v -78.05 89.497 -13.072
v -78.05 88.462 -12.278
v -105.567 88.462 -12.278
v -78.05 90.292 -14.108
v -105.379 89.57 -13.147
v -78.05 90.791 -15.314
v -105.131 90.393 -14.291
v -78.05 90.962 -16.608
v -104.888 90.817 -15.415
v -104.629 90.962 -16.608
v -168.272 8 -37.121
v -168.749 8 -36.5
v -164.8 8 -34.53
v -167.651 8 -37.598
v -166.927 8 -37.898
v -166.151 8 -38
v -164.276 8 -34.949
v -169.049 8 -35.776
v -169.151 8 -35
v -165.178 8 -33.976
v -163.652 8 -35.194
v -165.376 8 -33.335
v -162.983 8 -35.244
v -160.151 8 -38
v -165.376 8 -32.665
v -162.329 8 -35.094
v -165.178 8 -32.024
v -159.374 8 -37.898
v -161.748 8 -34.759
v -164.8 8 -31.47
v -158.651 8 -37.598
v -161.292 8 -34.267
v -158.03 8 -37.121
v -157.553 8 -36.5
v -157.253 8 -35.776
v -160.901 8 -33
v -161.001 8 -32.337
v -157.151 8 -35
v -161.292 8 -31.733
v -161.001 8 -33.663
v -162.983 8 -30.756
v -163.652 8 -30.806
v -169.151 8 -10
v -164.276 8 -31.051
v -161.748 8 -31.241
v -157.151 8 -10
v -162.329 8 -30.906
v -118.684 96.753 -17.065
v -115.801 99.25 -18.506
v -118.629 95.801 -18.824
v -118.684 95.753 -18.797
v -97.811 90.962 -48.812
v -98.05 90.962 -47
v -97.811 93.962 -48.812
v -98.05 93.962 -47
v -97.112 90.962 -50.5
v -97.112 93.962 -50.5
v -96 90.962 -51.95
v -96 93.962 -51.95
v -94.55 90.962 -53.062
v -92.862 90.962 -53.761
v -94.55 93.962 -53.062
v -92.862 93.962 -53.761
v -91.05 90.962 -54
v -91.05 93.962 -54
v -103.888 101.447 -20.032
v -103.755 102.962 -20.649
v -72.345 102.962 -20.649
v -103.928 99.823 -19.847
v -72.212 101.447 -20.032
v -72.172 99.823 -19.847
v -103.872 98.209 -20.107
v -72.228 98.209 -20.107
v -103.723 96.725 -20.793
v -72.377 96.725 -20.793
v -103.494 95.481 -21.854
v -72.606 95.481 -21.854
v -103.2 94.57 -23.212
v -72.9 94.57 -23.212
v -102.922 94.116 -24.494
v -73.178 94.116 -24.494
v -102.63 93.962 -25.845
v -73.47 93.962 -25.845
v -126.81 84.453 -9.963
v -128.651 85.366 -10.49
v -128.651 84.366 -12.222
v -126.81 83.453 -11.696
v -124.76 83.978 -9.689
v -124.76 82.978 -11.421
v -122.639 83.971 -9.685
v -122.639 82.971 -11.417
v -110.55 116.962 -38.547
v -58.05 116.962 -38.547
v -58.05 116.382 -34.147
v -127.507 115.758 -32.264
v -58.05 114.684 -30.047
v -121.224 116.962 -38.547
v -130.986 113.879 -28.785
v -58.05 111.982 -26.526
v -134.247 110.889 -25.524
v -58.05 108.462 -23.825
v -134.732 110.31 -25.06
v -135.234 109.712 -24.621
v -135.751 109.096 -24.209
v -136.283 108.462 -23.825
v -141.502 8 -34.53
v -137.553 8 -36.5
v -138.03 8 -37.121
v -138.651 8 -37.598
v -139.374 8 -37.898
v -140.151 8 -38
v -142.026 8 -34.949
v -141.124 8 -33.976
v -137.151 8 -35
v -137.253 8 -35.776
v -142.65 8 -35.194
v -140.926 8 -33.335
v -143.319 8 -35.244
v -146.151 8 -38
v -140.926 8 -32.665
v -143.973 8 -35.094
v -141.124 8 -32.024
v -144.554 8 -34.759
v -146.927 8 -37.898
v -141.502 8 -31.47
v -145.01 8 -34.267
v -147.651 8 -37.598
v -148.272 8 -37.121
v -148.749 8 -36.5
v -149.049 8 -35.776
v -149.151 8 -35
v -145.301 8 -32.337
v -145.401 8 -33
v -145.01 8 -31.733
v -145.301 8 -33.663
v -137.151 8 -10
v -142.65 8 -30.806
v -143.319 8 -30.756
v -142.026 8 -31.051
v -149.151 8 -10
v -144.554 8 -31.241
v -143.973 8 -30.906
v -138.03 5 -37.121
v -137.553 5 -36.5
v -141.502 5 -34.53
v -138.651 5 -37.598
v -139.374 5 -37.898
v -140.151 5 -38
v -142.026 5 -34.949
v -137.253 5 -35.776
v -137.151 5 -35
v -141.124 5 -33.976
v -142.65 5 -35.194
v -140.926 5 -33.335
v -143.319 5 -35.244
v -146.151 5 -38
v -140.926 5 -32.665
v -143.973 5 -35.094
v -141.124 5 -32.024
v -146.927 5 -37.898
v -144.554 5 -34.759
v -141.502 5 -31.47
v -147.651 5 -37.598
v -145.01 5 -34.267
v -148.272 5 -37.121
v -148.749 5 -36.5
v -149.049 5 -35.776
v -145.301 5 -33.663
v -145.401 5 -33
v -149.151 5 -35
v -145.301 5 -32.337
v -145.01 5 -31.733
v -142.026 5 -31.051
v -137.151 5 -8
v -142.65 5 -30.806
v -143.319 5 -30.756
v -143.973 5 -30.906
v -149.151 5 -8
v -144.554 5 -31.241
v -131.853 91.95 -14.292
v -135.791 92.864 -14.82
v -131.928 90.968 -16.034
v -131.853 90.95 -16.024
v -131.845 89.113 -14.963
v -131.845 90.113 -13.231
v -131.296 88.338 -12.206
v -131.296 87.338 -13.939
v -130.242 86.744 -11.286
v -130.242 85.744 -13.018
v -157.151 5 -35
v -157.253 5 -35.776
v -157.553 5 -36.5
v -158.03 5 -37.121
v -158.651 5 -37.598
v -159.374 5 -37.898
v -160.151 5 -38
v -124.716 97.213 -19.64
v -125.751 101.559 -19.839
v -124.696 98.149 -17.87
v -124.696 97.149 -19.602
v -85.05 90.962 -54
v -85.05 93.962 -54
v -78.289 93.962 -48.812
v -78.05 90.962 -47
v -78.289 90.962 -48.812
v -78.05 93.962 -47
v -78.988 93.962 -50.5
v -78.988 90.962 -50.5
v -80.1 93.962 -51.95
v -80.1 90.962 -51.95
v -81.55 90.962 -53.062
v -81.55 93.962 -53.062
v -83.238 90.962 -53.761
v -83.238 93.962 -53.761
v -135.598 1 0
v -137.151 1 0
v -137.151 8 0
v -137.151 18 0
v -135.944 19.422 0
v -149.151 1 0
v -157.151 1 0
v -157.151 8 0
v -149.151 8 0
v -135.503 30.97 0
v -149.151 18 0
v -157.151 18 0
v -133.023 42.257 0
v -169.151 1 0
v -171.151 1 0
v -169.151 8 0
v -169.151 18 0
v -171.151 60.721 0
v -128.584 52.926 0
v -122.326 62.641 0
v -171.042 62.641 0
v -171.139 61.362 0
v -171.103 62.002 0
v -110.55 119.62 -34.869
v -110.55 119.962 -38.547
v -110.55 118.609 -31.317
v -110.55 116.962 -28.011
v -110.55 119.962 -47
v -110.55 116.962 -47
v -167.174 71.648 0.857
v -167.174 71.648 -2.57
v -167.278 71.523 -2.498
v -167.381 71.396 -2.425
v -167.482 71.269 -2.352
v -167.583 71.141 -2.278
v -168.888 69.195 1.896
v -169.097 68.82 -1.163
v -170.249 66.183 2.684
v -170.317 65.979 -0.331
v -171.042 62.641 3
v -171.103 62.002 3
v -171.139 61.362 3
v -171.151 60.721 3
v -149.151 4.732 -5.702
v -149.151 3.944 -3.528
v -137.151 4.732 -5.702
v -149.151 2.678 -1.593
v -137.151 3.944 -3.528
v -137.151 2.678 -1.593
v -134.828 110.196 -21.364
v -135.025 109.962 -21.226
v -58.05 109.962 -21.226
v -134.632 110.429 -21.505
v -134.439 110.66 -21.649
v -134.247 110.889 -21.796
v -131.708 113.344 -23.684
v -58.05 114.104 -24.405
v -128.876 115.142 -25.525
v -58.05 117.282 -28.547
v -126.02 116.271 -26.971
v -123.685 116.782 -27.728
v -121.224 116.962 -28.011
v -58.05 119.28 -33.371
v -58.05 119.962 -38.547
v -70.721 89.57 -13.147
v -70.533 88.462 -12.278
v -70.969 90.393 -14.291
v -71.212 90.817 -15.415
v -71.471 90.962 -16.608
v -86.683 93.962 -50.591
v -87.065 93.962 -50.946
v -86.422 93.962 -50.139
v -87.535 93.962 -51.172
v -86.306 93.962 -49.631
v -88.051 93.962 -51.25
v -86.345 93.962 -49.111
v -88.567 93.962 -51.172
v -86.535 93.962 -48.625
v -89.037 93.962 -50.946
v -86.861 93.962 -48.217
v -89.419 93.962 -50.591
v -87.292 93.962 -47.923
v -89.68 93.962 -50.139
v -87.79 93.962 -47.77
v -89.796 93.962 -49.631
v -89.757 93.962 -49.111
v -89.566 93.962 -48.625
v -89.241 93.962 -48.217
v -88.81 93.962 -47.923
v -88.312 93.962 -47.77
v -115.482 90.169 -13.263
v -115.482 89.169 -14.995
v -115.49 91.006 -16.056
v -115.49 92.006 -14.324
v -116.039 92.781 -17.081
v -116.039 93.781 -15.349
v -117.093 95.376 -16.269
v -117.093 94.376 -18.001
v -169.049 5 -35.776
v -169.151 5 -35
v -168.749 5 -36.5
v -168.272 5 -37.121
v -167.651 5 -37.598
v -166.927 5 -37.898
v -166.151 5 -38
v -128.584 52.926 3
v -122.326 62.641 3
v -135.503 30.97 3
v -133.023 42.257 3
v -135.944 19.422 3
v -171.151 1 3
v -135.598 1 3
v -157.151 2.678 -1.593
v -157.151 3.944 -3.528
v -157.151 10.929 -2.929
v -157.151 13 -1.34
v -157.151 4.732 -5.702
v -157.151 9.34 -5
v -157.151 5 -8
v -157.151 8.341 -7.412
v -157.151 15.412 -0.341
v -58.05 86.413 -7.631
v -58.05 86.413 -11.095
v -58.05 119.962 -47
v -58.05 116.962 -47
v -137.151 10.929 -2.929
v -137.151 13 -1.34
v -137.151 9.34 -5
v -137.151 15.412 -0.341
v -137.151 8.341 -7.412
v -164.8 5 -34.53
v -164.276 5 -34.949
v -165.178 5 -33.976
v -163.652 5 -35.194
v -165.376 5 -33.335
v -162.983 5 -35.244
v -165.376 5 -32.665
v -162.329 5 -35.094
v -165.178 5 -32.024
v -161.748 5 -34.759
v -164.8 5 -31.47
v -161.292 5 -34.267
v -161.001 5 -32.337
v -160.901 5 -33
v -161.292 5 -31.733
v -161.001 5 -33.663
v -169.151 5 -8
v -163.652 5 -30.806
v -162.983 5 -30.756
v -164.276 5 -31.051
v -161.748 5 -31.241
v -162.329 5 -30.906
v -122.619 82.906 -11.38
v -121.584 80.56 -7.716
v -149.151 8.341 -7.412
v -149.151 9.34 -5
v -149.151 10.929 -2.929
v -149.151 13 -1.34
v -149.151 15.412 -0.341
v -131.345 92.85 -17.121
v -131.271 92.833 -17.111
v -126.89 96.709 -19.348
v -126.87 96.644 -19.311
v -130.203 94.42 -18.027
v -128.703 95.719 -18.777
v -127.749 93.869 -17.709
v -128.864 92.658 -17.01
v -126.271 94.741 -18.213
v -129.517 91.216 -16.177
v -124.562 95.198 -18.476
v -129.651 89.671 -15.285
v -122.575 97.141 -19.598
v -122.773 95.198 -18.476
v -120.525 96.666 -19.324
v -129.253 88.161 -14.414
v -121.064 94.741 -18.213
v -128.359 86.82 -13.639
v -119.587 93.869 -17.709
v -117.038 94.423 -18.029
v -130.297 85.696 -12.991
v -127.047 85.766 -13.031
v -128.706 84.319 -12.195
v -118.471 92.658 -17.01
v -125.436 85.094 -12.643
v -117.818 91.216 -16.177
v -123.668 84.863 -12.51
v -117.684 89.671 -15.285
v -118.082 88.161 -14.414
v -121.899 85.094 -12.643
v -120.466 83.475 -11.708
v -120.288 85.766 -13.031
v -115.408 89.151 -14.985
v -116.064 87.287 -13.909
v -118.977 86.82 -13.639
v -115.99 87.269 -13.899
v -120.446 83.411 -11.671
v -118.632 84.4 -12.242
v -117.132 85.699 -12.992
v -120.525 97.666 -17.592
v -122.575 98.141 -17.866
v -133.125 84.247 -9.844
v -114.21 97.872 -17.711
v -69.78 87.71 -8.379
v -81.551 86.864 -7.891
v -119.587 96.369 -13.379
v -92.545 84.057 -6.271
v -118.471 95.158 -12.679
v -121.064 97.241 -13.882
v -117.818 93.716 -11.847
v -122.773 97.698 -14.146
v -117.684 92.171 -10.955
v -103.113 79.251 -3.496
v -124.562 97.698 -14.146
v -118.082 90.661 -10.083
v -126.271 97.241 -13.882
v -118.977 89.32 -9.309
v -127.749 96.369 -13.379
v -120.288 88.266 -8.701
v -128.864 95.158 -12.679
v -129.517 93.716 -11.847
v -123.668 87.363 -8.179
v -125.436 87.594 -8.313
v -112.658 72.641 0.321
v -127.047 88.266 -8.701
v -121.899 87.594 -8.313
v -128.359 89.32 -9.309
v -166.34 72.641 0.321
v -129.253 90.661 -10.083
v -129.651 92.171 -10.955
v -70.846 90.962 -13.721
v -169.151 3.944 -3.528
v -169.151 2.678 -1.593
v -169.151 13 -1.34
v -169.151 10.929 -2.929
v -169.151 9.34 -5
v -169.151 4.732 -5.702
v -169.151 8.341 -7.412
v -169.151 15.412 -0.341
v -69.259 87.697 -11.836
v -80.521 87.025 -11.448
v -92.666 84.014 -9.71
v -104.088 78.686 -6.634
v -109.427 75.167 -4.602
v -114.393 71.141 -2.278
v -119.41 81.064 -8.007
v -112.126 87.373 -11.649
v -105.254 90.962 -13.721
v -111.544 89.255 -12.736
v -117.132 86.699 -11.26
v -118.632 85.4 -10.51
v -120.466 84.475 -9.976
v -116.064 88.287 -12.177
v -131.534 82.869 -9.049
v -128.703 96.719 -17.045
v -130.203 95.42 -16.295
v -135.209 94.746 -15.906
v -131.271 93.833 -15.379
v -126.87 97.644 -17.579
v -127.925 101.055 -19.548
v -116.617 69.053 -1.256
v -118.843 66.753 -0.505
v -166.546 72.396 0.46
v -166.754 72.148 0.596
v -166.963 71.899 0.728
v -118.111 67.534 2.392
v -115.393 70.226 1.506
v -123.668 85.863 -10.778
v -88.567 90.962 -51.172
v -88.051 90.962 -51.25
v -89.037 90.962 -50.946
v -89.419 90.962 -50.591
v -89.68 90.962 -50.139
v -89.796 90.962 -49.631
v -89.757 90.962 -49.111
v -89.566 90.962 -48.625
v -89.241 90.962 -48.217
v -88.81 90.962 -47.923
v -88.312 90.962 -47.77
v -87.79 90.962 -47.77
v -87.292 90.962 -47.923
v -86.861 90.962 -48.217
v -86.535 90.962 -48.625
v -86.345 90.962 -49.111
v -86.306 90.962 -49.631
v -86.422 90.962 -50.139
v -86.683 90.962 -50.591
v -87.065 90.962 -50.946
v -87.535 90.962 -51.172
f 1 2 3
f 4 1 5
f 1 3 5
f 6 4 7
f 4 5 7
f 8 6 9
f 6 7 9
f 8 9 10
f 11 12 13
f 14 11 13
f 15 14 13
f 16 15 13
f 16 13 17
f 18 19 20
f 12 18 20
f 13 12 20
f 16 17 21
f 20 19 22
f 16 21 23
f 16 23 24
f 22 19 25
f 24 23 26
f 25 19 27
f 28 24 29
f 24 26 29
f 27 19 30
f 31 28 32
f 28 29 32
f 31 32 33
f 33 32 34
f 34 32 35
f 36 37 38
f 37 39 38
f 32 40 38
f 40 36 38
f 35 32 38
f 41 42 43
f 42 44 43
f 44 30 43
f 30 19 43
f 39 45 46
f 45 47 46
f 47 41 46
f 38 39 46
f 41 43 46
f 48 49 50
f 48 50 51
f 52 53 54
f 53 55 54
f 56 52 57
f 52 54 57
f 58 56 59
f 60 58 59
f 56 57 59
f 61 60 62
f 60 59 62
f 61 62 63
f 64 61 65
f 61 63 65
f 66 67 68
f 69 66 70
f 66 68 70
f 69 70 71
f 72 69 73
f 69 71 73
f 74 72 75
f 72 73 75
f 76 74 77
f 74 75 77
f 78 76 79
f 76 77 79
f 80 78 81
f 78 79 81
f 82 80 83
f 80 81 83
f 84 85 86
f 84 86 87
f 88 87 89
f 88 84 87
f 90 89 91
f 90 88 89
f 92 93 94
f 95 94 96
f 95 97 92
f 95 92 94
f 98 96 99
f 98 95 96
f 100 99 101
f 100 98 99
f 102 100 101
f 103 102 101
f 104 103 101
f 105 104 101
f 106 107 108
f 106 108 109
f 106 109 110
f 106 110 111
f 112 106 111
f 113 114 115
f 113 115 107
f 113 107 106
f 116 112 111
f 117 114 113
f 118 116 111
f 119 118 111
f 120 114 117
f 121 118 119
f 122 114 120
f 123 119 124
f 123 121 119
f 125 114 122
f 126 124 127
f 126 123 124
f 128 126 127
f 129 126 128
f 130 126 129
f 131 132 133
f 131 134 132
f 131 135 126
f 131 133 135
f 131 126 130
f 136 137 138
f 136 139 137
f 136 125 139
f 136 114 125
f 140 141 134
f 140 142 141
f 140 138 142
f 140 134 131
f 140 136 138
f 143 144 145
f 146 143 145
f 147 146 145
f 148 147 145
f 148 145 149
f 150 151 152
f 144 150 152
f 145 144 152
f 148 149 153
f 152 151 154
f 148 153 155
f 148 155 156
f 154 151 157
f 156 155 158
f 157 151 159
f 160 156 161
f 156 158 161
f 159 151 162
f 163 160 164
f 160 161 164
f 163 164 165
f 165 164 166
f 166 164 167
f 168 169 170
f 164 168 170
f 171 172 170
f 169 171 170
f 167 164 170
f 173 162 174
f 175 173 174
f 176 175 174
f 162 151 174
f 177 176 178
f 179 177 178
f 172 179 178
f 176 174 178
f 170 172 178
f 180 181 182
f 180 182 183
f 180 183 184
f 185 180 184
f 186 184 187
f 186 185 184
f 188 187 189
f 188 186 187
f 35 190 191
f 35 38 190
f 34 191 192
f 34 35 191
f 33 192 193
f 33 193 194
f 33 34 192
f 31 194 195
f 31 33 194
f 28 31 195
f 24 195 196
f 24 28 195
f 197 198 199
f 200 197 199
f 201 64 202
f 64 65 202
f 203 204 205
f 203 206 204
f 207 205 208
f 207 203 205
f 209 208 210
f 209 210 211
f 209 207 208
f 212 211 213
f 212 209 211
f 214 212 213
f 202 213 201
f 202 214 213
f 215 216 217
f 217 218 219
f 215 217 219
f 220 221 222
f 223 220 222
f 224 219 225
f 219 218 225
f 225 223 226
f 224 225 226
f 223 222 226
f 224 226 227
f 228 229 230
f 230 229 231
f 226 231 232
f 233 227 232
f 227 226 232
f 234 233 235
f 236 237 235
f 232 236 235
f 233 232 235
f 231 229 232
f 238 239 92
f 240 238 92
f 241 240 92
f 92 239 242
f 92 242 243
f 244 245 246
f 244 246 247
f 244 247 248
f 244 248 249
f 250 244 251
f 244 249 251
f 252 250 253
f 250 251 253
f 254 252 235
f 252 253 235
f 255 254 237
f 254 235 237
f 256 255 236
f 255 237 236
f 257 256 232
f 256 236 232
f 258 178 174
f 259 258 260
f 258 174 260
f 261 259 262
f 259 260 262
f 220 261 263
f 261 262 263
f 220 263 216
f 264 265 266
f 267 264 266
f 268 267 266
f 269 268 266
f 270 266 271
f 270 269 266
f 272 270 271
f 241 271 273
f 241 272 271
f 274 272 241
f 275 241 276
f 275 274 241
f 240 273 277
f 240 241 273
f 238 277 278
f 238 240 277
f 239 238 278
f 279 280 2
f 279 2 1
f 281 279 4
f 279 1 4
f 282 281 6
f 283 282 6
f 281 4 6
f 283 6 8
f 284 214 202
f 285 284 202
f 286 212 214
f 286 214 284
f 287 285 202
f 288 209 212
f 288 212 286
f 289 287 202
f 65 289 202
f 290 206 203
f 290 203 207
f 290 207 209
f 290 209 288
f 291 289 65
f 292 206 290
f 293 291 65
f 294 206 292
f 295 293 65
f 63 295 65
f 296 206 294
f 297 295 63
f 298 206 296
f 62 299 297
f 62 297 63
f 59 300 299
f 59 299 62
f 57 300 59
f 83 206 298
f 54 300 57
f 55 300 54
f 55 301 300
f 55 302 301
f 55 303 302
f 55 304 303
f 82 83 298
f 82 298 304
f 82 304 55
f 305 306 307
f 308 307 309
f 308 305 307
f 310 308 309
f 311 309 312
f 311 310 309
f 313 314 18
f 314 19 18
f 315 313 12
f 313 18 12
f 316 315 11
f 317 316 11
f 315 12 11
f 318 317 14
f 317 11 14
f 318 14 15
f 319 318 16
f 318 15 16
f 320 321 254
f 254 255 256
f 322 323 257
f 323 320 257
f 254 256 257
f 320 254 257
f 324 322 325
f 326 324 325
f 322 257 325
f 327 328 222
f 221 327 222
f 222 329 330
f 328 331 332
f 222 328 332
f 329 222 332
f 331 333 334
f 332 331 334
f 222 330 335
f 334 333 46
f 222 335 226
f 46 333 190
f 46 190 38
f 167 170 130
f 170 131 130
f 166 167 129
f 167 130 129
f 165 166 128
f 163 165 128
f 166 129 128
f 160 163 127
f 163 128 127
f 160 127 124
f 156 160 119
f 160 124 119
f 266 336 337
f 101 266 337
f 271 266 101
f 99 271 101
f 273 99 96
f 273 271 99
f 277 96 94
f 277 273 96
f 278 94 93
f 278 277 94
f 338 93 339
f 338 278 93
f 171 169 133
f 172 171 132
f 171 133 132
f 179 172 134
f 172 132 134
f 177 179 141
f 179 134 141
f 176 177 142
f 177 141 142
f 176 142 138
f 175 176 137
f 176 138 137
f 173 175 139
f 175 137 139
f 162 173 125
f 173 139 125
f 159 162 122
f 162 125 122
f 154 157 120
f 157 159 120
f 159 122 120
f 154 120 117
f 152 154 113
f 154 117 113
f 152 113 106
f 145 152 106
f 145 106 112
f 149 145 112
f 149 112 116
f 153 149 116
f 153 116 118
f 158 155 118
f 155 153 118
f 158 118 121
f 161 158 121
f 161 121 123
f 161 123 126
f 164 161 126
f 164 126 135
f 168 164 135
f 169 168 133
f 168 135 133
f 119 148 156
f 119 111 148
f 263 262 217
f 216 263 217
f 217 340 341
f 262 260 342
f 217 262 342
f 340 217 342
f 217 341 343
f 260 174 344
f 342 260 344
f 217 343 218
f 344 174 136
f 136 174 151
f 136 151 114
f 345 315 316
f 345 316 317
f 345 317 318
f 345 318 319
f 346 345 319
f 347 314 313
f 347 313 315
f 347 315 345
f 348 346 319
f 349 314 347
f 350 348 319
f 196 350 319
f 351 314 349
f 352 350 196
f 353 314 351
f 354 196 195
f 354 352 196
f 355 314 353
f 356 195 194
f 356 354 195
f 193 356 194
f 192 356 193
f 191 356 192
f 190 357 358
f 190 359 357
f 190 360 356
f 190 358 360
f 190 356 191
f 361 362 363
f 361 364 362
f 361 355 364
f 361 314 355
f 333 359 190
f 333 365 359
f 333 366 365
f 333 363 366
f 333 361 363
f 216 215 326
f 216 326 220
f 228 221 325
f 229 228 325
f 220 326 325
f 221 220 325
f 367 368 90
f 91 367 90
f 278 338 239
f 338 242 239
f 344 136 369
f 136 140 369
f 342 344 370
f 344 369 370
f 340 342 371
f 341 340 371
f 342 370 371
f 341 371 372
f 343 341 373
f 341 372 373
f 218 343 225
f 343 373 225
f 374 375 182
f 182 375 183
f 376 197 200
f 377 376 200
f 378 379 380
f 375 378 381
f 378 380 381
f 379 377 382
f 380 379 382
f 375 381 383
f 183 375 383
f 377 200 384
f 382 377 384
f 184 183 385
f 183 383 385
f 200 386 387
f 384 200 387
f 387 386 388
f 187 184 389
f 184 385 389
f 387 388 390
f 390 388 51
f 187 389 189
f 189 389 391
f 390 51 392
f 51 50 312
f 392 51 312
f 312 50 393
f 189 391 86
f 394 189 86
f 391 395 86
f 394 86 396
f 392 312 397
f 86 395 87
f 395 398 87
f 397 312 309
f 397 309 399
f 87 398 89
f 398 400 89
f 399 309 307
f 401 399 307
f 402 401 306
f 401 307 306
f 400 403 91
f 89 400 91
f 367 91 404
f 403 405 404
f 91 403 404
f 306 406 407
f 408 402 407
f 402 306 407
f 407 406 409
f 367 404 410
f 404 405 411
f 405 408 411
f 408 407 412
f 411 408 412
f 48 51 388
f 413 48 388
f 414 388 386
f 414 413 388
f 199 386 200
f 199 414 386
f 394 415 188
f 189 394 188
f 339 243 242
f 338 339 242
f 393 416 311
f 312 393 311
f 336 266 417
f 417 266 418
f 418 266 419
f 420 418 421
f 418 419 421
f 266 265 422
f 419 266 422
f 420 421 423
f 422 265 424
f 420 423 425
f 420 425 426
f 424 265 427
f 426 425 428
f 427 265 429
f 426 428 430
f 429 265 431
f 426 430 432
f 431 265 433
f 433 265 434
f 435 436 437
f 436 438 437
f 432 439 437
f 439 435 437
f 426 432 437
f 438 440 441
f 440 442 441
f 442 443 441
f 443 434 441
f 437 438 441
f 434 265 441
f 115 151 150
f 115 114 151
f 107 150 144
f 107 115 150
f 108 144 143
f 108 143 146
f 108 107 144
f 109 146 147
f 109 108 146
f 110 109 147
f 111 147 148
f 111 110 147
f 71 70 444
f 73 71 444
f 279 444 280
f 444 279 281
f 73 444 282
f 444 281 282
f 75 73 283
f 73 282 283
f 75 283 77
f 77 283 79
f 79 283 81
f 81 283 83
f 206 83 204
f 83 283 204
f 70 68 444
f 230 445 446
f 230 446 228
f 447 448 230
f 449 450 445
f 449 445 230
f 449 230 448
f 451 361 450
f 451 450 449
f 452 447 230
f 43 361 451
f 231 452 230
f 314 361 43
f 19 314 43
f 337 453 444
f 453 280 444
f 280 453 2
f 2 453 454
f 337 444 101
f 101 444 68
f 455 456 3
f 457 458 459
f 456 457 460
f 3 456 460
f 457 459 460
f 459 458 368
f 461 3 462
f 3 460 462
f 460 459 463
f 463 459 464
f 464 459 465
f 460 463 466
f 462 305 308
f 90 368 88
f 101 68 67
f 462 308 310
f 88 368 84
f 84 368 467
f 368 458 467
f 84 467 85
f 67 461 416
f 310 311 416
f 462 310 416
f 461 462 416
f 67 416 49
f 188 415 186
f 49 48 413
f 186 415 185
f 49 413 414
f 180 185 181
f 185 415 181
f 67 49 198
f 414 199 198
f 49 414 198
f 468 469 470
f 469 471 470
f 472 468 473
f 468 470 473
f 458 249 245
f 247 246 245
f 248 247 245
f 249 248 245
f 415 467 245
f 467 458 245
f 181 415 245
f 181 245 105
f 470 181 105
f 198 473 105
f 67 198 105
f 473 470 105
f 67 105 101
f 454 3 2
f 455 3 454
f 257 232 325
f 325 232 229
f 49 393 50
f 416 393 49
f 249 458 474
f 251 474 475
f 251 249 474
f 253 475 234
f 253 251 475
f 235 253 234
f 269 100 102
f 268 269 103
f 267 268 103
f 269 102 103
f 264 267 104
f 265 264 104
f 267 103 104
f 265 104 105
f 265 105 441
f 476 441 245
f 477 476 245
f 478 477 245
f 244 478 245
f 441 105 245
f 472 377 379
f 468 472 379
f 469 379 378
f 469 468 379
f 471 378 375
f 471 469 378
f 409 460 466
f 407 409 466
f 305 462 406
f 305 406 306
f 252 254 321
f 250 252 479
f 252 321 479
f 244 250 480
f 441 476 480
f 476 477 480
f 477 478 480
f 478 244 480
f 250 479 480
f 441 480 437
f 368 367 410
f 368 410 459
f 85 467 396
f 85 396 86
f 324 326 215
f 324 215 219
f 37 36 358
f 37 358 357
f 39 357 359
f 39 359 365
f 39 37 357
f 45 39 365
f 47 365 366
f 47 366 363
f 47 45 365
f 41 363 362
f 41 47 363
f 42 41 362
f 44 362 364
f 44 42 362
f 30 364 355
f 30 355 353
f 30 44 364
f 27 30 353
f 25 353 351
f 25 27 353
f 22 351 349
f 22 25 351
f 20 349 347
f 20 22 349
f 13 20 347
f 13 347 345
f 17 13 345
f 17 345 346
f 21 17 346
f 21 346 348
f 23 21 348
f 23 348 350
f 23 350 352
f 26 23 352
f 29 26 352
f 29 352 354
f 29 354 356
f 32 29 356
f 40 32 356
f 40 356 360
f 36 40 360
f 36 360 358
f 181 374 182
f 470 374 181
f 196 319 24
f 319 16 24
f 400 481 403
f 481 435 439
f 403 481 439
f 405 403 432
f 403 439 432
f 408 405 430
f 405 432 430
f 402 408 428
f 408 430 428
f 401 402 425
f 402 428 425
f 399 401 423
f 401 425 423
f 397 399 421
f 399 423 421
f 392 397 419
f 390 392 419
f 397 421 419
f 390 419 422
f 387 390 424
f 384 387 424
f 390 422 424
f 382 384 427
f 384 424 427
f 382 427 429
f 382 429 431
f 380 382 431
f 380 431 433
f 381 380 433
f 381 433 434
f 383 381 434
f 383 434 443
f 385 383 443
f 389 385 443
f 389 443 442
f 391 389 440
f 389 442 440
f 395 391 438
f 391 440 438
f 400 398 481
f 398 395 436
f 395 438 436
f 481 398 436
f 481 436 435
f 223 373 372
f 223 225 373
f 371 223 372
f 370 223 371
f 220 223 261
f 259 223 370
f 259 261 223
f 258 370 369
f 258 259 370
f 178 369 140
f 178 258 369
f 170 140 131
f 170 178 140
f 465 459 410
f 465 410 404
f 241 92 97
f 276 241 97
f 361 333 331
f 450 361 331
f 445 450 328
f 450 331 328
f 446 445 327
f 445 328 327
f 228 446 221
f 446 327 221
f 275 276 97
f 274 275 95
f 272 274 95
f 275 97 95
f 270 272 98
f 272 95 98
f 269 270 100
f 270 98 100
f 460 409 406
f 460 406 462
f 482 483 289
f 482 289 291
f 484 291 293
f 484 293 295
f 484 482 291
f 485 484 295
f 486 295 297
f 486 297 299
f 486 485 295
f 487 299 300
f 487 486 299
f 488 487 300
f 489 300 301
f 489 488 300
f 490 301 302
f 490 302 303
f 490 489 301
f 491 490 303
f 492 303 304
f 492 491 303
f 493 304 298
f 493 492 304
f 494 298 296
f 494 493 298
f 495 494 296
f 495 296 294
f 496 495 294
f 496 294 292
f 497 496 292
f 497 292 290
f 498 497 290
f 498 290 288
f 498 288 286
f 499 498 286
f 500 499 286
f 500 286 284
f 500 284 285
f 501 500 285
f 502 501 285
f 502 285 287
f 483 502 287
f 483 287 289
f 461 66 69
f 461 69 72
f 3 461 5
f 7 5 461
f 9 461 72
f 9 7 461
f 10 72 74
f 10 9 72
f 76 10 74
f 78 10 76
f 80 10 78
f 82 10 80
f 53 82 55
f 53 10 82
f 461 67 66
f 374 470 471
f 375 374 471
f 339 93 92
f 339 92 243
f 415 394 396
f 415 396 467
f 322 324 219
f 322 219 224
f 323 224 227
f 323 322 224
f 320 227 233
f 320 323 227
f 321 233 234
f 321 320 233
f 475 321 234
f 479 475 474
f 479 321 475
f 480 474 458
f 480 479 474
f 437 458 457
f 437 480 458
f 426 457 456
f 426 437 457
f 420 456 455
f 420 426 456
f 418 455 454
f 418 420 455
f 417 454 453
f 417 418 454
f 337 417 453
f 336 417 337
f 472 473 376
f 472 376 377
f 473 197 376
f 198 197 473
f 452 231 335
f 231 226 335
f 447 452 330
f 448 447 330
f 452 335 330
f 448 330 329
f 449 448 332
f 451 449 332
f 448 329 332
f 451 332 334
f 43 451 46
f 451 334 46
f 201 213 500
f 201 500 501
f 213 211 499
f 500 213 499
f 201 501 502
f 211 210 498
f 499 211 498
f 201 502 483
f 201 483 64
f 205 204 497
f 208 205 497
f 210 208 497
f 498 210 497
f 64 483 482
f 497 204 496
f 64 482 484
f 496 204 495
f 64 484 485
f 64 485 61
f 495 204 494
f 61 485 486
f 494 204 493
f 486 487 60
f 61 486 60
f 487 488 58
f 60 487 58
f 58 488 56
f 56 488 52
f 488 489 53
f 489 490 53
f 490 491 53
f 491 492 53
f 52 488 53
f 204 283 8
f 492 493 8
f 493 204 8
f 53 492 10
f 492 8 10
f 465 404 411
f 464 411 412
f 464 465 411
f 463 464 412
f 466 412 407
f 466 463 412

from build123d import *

# Parameters (mm, degrees)
SALIENTE_EXTRUIR1_DEPTH  = 58.05
REDONDEO1_R              = 20
REDONDEO2_R              = 20
REDONDEO3_R              = 17
REDONDEO4_R              = 17
CAVIDAD1_START           = -47
CAVIDAD1_DEPTH           = 51
CROQUIS8_W               = 12
CROQUIS8_H               = 3
SALIENTE_EXTRUIR2_DEPTH  = 38
CROQUIS9_R               = 2.25
CORTAR_EXTRUIR6_DEPTH    = 135.588949923
SALIENTE_EXTRUIR3_REACH  = 146.947
CROQUIS11_W              = 20
CROQUIS11_H              = 3
CROQUIS12_W              = 69.238292886
CROQUIS12_H              = 3
CORTAR_EXTRUIR7_DEPTH    = 1
CROQUIS15_R              = 1.75
CORTAR_EXTRUIR10_DEPTH   = 5
REDONDEO5_R              = 7
REDONDEO6_R              = 3
CROQUIS18_R              = 6
CORTAR_EXTRUIR12_DEPTH   = 146.081609054
CROQUIS19_R              = 8.25
CROQUIS19_R_2            = 6
SALIENTE_EXTRUIR4_DEPTH  = 2
CROQUIS16_R              = 65
CORTAR_EXTRUIR11_DEPTH   = 145.946782753
SALIENTE_EXTRUIR5_DEPTH  = 3
NERVIO8_START            = -1.125
NERVIO8_DEPTH            = 2.25
MATRIZC2_COUNT           = 6
REDONDEO6_OF_SIMETR_A1_R = 3
REDONDEO7_R              = 10
REDONDEO8_R              = 10
REDONDEO9_R              = 6
CORTAR_EXTRUIR14_DEPTH   = 145.946782753
REDONDEO10_R             = 5


with BuildPart() as part:
    # Croquis1 → Saliente-Extruir1 (new, symmetric)
    with BuildSketch(Plane(origin=(0, 0, 0), x_dir=(0, 0, -1), z_dir=(1, 0, 0))):
        Polygon((0, 0), (0, 67.196152423), (28.732050808, 116.961524227), (47, 116.961524227), (47, 119.961524227), (27, 119.961524227), (-3, 68), (-3, 0), align=None)
    extrude(amount=SALIENTE_EXTRUIR1_DEPTH, both=True)

    # Redondeo1
    redondeo1_edges = [part.edges().sort_by_distance(p)[0] for p in [
        (0, 68, 3),
    ]]
    fillet(redondeo1_edges, radius=REDONDEO1_R)

    # Redondeo2
    redondeo2_edges = [part.edges().sort_by_distance(p)[0] for p in [
        (0, 119.961524227, -27),
    ]]
    fillet(redondeo2_edges, radius=REDONDEO2_R)

    # Redondeo3
    redondeo3_edges = [part.edges().sort_by_distance(p)[0] for p in [
        (0, 116.961524227, -28.732050808),
    ]]
    fillet(redondeo3_edges, radius=REDONDEO3_R)

    # Redondeo4
    redondeo4_edges = [part.edges().sort_by_distance(p)[0] for p in [
        (0, 67.196152423, 0),
    ]]
    fillet(redondeo4_edges, radius=REDONDEO4_R)

    # Cavidad1: read off the stored shape, not the designer's step
    # Cavidad1 outline → Cavidad1 (cut)
    with BuildSketch(Plane.XY.offset(CAVIDAD1_START)):
        with BuildLine():
            Line((58.05, 0), (58.05, 119.961524227))
            Line((58.05, 119.961524227), (-5.55, 119.961524227))
            Line((-5.55, 119.961524227), (-5.55, 116.961524227))
            Line((-5.55, 116.961524227), (5.123846837, 116.961524227))
            ThreePointArc((5.123846837, 116.961524227), (12.308357287, 115.368756607), (18.14660237, 110.888913592))
            Line((18.14660237, 110.888913592), (51.073651347, 71.647984679))
            ThreePointArc((51.073651347, 71.647984679), (54.025670368, 66.534937751), (55.050895814, 60.720595315))
            Line((55.050895814, 60.720595315), (55.050895814, 0))
            Line((55.050895814, 0), (58.05, 0))
        make_face()
    extrude(amount=CAVIDAD1_DEPTH, mode=Mode.SUBTRACT)

    # Croquis8 → Saliente-Extruir2 (add)
    with BuildSketch(Plane(origin=(0, 0, 0), x_dir=(-1, 0, 0), z_dir=(0, 0, -1))):
        with Locations((-47.050895814, 6.5)):
            Rectangle(CROQUIS8_W, CROQUIS8_H)
    saliente_extruir2 = extrude(amount=SALIENTE_EXTRUIR2_DEPTH)

    # Croquis9 → Cortar-Extruir6 (cut, through all)
    with BuildSketch(Plane(origin=(0, 8, 0), x_dir=(1, 0, 0), z_dir=(0, 1, 0))):
        with Locations(Location((47.050895814, 33, 0), (0, 0, 180))):
            Circle(CROQUIS9_R)
    cortar_extruir6 = extrude(amount=-CORTAR_EXTRUIR6_DEPTH, mode=Mode.SUBTRACT)

    # Saliente-Extruir3: up to this plane
    saliente_extruir3_end = Plane(origin=(58.05, 67.196152423, 0), z_dir=(0, 0.49999999999999767, 0.86602540378444))
    # Croquis11 → Saliente-Extruir3 (add, up to the surface)
    with BuildSketch(Plane(origin=(0, 0, -54), x_dir=(-1, 0, 0), z_dir=(0, 0, -1)), mode=Mode.PRIVATE) as saliente_extruir3_sk1:
        with Locations((28.05, 92.461524227)):
            Rectangle(CROQUIS11_W, CROQUIS11_H)
    saliente_extruir3_tool1 = split(extrude(saliente_extruir3_sk1.sketch, amount=-SALIENTE_EXTRUIR3_REACH, mode=Mode.PRIVATE), bisect_by=saliente_extruir3_end, keep=Keep.BOTH, mode=Mode.PRIVATE)
    add(saliente_extruir3_tool1.solids().sort_by_distance((-28.05, 92.461524, -54))[0])

    # Croquis12 → Cortar-Extruir7 (cut)
    with BuildSketch(Plane.XZ):
        with Locations((20.431749371, 1.5)):
            Rectangle(CROQUIS12_W, CROQUIS12_H)
    extrude(amount=-CORTAR_EXTRUIR7_DEPTH, mode=Mode.SUBTRACT)

    # Croquis15 → Cortar-Extruir10 (cut)
    with BuildSketch(Plane.XZ.offset(-90.961524227)):
        with Locations(Location((-28.049104186, -49.5, 0), (0, 0, 270))):
            Circle(CROQUIS15_R)
    extrude(amount=-CORTAR_EXTRUIR10_DEPTH, mode=Mode.SUBTRACT)

    # Redondeo5
    redondeo5_edges = [part.edges().sort_by_distance(p)[0] for p in [
        (-18.05, 92.461524227, -54),
        (-38.05, 92.461524227, -54),
    ]]
    fillet(redondeo5_edges, radius=REDONDEO5_R)

    # Redondeo6
    redondeo6_edges = [part.edges().sort_by_distance(p)[0] for p in [
        (53.050895814, 6.5, -38),
        (41.050895814, 6.5, -38),
    ]]
    fillet(redondeo6_edges, radius=REDONDEO6_R)

    # Croquis18 → Cortar-Extruir12 (cut, through all)
    with BuildSketch(Plane(origin=(0, 18.299038106, 31.694863729), x_dir=(1, 0, 0), z_dir=(0, 0.4999999999999976, 0.86602540378444))):
        with Locations(Location((7.567578046, 85.748711306, 0), (0, 0, 270))):
            Circle(CROQUIS18_R)
    extrude(amount=-CORTAR_EXTRUIR12_DEPTH, mode=Mode.SUBTRACT)

    # Croquis19 → Saliente-Extruir4 (add)
    with BuildSketch(Plane(origin=(0, 16.799038106, 29.096787517), x_dir=(-1, 0, 0), z_dir=(0, -0.4999999999999977, -0.8660254037844399))):
        with Locations(Location((-7.567578046, 85.748711306, 0), (0, 0, 270))):
            Circle(CROQUIS19_R)
        with Locations(Location((-7.567578046, 85.748711306, 0), (0, 0, 270))):
            Circle(CROQUIS19_R_2, mode=Mode.SUBTRACT)
    extrude(amount=SALIENTE_EXTRUIR4_DEPTH)

    # Croquis16 → Cortar-Extruir11 (cut, through all)
    with BuildSketch(Plane.XY.offset(3)):
        with Locations((-45.071920691, 22.721524227)):
            Circle(CROQUIS16_R)
    extrude(amount=-CORTAR_EXTRUIR11_DEPTH, mode=Mode.SUBTRACT)

    # Croquis25 → Saliente-Extruir5 (add)
    with BuildSketch(Plane.XZ.offset(-90.961524227)):
        Polygon((-38.05, -13.720943809), (-45.254421175, -13.720943809), (-38.05, -47), align=None)
        Polygon((-10.845578825, -13.720943809), (-18.05, -47), (-18.05, -13.720943809), align=None)
    extrude(amount=-SALIENTE_EXTRUIR5_DEPTH)

    # Nervio8: read off the stored shape, not the designer's step
    # Nervio8 outline → Nervio8 (add)
    with BuildSketch(Plane(origin=(46.658144676, 40.407138583, -23.329072338), x_dir=(-0.7071067811865435, 0.6123724356957997, -0.353553390593273), z_dir=(-0.7071067811865517, -0.612372435695792, 0.35355339059327007)).offset(NERVIO8_START)):
        Polygon((47.10947397, -31.598076211), (47.032409489, -31.598076211), (43.032409489, -33.598076211), (47.10947397, -33.598076211), align=None)
    nervio8 = extrude(amount=NERVIO8_DEPTH)

    # MatrizC2: Nervio8 ×6 about axis
    matrizc2_axis = Axis((7.567578046, 74.260562333, -42.874355653), (0, -0.49999999999999767, -0.86602540378444))
    for i in range(1, MATRIZC2_COUNT):
        add(nervio8.rotate(matrizc2_axis, i * 360 / MATRIZC2_COUNT))

    # Simetría1: Saliente-Extruir2, Cortar-Extruir6 across plane
    add(saliente_extruir2.mirror(Plane(origin=(37.050895814, 0, 0), x_dir=(0, 0, 1), z_dir=(1, 0, 0))))
    add(cortar_extruir6.mirror(Plane(origin=(37.050895814, 0, 0), x_dir=(0, 0, 1), z_dir=(1, 0, 0))), mode=Mode.SUBTRACT)

    # Redondeo6 of Simetría1
    redondeo6_of_simetr_a1_edges = [part.edges().sort_by_distance(p)[0] for p in [
        (21.050895814, 6.5, -38),
        (33.050895814, 6.5, -38),
    ]]
    fillet(redondeo6_of_simetr_a1_edges, radius=REDONDEO6_OF_SIMETR_A1_R)

    # Redondeo7
    # the kernel refuses this fillet: 10 mm, written as the material it adds along each edge
    with BuildSketch(Plane(origin=(21.050895814, 5, 0), x_dir=(0, -1, 0), z_dir=(1, 0, 0))) as redondeo7_piece_1_section:
        with BuildLine():
            CenterArc((10, 8), REDONDEO7_R, 180, 53.130102354)
            Line((0, 8), (-0.2, 8))
            Line((-0.2, 8), (-0.2, 0))
            Line((-0.2, 0), (0, -0.2))
            ThreePointArc((0, -0.2), (2, -0.2), (3.88, -0.16))
            Line((3.88, -0.16), (4, 0))
        make_face()
    redondeo7_piece_1 = extrude(amount=32, mode=Mode.PRIVATE)
    redondeo7_piece_1 = split(redondeo7_piece_1, bisect_by=Plane(origin=(33.050895814, 5, 0), z_dir=(-1, 0, 0)), keep=Keep.TOP, mode=Mode.PRIVATE)
    add(redondeo7_piece_1)
    with BuildSketch(Plane(origin=(41.050895814, 5, 0), x_dir=(0, -1, 0), z_dir=(1, 0, 0))) as redondeo7_piece_2:
        with BuildLine():
            CenterArc((10, 8), REDONDEO7_R, 180, 53.130102354)
            Line((0, 8), (-0.2, 8))
            Line((-0.2, 8), (-0.2, 0))
            Line((-0.2, 0), (0, -0.2))
            ThreePointArc((0, -0.2), (2, -0.2), (3.88, -0.16))
            Line((3.88, -0.16), (4, 0))
        make_face()
    extrude(amount=12)
    with BuildSketch(Plane(origin=(53.050895814, 5, 0), x_dir=(0, -1, 0), z_dir=(-1, 0, 0))) as redondeo7_piece_3_section:
        with BuildLine():
            CenterArc((10, -8), REDONDEO7_R, 126.869897646, 53.130102354)
            Line((0, -8), (-0.2, -8))
            Line((-0.2, -8), (-0.2, 0))
            Line((-0.2, 0), (0, 0.2))
            ThreePointArc((0, 0.2), (2, 0.2), (3.88, 0.16))
            Line((3.88, 0.16), (4, 0))
        make_face()
    redondeo7_piece_3 = extrude(amount=32, mode=Mode.PRIVATE)
    redondeo7_piece_3 = split(redondeo7_piece_3, bisect_by=Plane(origin=(41.050895814, 5, 0), z_dir=(1, 0, 0)), keep=Keep.TOP, mode=Mode.PRIVATE)
    add(redondeo7_piece_3)
    with BuildSketch(Plane(origin=(33.050895814, 5, 0), x_dir=(0, -1, 0), z_dir=(-1, 0, 0))) as redondeo7_piece_4:
        with BuildLine():
            CenterArc((10, -8), REDONDEO7_R, 126.869897646, 53.130102354)
            Line((0, -8), (-0.2, -8))
            Line((-0.2, -8), (-0.2, 0))
            Line((-0.2, 0), (0, 0.2))
            ThreePointArc((0, 0.2), (2, 0.2), (3.88, 0.16))
            Line((3.88, 0.16), (4, 0))
        make_face()
    extrude(amount=12)

    # Redondeo8
    redondeo8_edges = [part.edges().sort_by_distance(p)[0] for p in [
        (47.050895814, 8, 0),
        (27.050895814, 8, 0),
    ]]
    fillet(redondeo8_edges, radius=REDONDEO8_R)

    # Redondeo9
    redondeo9_edges = [part.edges().sort_by_distance(p)[0] for p in [
        (-28.05, 93.961524227, -15.452994616),
    ]]
    fillet(redondeo9_edges, radius=REDONDEO9_R)

    # Croquis31 → Cortar-Extruir14 (cut, through all)
    with BuildSketch(Plane.XY.offset(3)):
        with BuildLine():
            Line((16.191244305, 1), (19.497703143, 1))
            Line((19.497703143, 1), (19.844268253, 19.421764692))
            ThreePointArc((19.844268253, 19.421764692), (18.686590065, 10.078253042), (16.191244305, 1))
        make_face()
    extrude(amount=-CORTAR_EXTRUIR14_DEPTH, mode=Mode.SUBTRACT)

    # Redondeo10
    redondeo10_edges = [part.edges().sort_by_distance(p)[0] for p in [
        (-28.05, 90.961524227, -13.720943809),
    ]]
    fillet(redondeo10_edges, radius=REDONDEO10_R)


with BuildPart() as body_2:
    # Simetría2: mirrored copy
    add(part.part.mirror(Plane(origin=(-58.05, 0, 0), x_dir=(0, 0, 1), z_dir=(1, 0, 0))))


solid = body_2.part
